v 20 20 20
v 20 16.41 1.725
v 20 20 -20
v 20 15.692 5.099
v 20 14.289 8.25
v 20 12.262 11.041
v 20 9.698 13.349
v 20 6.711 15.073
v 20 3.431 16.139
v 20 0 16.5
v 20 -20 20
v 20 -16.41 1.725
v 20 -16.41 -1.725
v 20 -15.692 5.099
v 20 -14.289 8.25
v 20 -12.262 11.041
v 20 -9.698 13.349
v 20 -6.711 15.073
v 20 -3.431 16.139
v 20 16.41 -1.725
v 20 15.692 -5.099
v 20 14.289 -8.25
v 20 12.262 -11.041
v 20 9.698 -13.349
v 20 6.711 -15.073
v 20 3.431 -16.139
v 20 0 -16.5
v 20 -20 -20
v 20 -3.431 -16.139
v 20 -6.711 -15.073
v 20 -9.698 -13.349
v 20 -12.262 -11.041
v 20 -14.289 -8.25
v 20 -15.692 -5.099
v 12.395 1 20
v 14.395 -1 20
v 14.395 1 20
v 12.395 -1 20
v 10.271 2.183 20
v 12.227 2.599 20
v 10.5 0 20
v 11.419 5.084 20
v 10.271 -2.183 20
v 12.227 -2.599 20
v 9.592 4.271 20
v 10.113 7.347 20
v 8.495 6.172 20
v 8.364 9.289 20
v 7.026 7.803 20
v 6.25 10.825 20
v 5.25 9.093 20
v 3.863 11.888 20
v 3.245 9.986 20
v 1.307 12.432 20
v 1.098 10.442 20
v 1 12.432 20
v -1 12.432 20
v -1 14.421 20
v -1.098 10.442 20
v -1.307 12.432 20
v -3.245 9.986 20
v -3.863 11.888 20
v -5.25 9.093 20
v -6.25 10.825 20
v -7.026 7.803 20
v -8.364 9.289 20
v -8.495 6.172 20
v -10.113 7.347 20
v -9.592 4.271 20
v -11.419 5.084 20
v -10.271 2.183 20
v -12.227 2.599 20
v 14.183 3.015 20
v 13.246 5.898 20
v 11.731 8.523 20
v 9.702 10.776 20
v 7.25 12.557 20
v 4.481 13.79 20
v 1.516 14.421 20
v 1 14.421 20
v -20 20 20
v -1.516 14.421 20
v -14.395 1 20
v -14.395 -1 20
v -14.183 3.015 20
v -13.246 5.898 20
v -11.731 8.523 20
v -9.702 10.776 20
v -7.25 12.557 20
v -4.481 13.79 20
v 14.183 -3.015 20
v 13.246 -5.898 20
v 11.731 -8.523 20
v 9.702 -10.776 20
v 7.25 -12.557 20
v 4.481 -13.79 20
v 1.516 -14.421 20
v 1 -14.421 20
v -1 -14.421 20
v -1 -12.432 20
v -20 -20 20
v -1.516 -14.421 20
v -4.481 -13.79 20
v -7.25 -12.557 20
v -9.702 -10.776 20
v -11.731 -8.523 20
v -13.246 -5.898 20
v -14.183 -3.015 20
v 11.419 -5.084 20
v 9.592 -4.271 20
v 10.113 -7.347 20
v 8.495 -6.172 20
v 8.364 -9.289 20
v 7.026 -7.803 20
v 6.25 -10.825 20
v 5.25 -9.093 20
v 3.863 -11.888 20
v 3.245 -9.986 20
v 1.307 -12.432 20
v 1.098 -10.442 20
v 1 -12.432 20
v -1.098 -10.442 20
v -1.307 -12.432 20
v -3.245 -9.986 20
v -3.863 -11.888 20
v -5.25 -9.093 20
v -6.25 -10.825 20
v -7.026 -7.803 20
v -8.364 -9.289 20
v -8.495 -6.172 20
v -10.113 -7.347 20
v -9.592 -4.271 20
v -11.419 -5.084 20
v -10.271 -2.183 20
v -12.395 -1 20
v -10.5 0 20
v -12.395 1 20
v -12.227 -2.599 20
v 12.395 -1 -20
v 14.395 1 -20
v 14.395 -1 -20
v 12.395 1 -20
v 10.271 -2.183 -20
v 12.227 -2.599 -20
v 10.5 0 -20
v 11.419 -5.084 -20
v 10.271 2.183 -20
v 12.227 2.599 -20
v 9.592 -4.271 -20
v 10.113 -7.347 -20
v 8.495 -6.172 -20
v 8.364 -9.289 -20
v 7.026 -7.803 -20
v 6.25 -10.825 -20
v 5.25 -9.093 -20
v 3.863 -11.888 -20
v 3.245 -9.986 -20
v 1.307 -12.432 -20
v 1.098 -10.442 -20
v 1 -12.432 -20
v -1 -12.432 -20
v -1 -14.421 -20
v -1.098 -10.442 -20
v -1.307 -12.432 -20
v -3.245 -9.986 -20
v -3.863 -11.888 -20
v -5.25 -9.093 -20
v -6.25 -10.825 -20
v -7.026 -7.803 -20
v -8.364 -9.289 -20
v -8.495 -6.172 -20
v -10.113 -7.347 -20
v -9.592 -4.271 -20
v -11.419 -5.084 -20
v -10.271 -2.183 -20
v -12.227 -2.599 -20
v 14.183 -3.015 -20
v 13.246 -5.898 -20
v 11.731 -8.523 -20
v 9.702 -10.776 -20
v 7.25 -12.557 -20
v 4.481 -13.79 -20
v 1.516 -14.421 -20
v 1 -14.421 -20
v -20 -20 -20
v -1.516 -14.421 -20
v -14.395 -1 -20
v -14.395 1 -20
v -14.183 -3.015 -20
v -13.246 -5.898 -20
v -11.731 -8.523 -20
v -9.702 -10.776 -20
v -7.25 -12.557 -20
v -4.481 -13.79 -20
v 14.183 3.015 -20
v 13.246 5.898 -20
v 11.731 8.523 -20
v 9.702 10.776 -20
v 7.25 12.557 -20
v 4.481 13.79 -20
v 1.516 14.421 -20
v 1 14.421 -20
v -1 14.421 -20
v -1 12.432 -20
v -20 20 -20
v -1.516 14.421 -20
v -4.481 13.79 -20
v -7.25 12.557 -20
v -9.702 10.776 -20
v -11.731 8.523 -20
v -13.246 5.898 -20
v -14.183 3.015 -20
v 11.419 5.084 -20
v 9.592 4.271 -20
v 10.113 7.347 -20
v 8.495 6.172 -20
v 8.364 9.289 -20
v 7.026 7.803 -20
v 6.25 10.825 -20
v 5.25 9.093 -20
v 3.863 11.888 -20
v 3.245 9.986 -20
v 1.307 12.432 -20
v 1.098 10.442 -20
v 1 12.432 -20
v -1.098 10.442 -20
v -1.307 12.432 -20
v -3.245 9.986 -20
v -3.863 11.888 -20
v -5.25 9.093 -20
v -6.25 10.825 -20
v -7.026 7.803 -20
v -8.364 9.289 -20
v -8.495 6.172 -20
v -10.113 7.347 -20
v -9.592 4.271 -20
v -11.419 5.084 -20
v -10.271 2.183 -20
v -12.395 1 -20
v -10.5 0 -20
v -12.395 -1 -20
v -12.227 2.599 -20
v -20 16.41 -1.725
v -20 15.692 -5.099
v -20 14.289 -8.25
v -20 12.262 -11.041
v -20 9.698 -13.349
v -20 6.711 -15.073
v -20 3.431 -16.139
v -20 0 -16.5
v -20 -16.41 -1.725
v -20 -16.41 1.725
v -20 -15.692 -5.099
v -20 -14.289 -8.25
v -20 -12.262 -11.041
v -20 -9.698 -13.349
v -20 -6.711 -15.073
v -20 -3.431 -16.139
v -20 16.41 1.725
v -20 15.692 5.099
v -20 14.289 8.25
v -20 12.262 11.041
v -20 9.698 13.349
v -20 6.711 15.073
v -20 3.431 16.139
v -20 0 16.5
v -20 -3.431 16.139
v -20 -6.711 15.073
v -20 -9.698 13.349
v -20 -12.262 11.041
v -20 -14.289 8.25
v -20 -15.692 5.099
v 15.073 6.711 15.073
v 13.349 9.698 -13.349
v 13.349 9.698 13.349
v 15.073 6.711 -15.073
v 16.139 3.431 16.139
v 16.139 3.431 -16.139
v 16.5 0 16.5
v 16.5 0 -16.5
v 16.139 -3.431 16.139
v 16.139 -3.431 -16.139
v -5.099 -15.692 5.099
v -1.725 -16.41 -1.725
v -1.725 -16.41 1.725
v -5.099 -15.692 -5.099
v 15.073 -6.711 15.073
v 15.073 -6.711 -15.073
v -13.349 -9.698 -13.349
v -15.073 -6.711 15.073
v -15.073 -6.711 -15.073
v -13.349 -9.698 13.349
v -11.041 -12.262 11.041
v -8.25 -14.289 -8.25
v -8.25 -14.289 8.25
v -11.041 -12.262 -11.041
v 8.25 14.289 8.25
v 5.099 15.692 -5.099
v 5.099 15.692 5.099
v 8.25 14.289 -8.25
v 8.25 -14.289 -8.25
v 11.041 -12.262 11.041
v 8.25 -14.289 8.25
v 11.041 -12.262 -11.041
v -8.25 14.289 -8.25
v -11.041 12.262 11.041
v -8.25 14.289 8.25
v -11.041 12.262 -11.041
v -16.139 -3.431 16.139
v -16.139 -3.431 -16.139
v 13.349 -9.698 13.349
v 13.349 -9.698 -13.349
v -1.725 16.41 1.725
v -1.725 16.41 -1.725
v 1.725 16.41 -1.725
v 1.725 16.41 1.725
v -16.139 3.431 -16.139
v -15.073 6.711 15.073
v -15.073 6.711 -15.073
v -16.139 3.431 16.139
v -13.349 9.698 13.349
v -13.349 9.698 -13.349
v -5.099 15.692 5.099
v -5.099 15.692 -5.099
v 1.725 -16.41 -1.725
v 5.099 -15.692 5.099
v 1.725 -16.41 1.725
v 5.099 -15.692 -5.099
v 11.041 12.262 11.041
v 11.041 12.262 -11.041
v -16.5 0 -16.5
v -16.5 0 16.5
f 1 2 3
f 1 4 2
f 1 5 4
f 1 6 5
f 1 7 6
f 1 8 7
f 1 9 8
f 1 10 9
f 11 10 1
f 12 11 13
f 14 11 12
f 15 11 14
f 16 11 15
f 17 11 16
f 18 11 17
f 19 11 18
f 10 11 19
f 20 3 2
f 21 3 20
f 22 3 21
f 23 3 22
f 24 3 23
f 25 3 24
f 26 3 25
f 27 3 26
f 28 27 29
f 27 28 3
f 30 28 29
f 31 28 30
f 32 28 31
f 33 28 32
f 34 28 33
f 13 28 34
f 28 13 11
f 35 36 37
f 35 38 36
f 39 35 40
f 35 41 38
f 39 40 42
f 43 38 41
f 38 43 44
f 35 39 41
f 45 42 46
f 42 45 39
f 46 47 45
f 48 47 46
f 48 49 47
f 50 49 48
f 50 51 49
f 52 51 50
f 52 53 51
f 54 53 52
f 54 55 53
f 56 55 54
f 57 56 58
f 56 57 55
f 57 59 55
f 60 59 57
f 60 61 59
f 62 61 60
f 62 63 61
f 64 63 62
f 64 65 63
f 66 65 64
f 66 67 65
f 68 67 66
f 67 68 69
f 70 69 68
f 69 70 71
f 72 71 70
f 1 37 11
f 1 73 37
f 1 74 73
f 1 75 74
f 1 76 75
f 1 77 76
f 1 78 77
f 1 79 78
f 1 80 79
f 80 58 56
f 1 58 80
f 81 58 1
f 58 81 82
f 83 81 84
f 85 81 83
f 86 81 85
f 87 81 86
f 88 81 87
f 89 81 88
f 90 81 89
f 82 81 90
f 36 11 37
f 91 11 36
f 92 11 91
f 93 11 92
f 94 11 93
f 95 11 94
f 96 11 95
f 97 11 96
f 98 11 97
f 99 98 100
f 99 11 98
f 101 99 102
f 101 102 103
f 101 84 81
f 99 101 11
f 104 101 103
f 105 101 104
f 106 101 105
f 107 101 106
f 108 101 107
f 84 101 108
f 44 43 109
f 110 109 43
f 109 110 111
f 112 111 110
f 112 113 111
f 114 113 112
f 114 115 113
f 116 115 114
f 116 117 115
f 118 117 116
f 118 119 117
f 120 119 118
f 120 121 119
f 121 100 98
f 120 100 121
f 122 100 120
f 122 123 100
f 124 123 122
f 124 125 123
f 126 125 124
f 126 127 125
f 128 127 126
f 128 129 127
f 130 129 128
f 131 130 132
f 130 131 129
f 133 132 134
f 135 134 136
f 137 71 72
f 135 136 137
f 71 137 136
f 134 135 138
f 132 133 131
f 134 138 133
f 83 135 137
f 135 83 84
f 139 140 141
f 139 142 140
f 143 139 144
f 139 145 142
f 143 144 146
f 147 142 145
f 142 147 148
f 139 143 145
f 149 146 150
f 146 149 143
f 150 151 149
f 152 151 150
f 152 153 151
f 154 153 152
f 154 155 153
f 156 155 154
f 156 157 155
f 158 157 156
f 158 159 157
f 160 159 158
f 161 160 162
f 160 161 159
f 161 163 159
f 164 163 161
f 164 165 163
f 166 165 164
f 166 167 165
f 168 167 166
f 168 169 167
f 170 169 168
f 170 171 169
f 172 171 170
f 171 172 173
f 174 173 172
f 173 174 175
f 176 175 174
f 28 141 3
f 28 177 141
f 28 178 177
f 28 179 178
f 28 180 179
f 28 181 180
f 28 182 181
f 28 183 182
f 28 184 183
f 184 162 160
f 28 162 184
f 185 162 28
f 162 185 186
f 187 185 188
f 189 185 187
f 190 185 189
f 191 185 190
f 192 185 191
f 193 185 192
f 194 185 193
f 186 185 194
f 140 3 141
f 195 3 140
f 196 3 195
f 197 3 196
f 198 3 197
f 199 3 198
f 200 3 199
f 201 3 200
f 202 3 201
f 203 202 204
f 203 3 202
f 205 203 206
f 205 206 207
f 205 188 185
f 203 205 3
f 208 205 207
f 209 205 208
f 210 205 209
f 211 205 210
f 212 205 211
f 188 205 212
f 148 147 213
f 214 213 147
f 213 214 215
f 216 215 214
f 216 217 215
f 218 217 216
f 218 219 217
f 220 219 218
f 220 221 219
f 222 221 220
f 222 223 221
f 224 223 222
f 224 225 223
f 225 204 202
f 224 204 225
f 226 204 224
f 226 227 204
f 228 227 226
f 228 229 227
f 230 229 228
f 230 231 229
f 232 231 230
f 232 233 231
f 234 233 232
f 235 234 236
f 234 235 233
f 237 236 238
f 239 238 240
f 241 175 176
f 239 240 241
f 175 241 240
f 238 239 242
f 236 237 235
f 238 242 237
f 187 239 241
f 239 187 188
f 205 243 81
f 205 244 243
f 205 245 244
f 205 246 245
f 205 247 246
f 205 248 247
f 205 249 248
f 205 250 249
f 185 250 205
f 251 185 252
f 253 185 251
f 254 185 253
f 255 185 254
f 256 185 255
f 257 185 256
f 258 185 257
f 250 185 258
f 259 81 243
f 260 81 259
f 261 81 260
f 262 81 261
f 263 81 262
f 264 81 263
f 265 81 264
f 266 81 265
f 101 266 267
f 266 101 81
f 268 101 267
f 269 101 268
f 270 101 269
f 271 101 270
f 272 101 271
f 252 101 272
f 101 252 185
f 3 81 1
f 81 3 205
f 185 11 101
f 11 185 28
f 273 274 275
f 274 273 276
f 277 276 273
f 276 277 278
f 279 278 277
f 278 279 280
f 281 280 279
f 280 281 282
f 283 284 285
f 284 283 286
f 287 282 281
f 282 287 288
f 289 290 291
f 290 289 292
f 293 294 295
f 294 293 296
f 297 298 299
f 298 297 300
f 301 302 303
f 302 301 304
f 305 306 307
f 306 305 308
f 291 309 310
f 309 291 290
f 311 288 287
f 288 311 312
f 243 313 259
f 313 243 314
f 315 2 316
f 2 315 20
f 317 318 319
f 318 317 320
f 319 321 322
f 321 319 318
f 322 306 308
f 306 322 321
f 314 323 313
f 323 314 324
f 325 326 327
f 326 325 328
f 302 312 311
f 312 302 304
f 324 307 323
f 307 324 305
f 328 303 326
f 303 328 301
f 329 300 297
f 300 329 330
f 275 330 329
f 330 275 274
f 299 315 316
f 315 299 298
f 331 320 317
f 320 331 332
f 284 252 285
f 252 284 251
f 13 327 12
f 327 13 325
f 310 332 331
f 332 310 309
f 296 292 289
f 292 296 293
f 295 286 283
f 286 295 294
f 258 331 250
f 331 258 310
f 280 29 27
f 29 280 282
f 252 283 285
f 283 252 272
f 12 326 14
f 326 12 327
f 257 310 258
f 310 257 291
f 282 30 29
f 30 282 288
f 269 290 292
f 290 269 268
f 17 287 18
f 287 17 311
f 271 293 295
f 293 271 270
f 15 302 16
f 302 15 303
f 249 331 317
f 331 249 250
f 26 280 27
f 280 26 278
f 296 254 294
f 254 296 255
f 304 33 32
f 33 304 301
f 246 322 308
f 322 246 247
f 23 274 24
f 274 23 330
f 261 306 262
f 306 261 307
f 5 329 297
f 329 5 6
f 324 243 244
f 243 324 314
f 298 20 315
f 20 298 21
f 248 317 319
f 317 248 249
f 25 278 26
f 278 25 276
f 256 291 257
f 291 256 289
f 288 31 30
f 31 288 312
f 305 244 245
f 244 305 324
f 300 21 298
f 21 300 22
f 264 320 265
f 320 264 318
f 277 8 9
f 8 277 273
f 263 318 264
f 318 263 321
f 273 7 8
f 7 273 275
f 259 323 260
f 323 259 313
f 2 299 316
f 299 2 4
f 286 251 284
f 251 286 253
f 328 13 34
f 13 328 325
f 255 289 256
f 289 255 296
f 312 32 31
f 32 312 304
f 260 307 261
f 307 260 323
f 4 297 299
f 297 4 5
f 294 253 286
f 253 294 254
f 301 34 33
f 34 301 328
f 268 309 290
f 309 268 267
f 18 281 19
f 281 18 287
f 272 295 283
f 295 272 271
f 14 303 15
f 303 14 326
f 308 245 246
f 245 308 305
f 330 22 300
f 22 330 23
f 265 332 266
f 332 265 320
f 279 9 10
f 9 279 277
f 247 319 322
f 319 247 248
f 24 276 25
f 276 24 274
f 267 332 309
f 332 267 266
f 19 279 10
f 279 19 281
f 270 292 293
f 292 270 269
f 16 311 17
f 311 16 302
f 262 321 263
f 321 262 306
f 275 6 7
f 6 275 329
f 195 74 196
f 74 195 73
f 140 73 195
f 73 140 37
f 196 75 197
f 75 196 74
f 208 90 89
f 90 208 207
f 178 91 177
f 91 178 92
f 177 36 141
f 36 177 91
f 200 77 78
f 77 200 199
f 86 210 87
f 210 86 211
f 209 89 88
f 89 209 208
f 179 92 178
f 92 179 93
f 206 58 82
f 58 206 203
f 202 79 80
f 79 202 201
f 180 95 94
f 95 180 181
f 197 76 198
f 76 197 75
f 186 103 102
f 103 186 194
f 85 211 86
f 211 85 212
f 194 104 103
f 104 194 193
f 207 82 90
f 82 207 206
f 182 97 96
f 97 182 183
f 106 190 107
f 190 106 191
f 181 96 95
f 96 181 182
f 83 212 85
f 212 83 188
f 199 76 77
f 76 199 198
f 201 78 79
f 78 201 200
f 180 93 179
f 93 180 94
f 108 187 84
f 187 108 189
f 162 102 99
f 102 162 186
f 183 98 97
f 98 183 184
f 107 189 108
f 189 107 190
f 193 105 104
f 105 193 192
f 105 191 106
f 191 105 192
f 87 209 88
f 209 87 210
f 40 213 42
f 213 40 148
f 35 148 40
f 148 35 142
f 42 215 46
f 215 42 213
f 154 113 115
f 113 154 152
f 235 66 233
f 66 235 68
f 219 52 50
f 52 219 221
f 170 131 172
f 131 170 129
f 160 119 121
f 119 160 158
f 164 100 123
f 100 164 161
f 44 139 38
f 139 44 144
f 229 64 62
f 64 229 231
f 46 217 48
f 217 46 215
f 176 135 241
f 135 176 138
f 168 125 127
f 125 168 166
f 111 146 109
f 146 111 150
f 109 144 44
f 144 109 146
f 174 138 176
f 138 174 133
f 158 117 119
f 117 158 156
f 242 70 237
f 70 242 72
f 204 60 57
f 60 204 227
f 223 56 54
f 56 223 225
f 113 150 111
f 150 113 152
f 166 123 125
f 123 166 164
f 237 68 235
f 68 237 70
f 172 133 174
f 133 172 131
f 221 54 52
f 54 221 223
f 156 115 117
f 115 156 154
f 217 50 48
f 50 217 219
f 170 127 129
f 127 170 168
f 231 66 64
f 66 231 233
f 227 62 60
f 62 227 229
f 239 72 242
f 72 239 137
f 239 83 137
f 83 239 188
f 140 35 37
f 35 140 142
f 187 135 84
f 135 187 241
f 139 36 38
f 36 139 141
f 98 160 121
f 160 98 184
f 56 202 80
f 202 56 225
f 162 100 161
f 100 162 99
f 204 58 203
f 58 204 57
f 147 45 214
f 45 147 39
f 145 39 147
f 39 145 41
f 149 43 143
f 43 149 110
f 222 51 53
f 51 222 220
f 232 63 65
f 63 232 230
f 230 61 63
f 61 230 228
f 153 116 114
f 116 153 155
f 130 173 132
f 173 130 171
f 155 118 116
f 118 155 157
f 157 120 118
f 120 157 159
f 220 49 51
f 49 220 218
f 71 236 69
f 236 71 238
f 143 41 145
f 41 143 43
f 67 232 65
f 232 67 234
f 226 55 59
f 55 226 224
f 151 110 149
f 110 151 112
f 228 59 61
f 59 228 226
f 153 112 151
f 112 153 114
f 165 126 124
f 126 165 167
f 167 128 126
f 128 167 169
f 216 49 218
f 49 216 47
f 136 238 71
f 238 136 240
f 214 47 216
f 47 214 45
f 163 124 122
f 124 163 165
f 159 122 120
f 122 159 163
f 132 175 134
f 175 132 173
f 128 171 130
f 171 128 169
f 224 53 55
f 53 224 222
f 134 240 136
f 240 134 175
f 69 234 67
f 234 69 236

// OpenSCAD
PEEK_chamber_height = 40;
PEEK_diameter = 15;
PEEK_chamber = (PEEK_diameter/2) + 3;
PEEK_chamber_outer = (PEEK_chamber)+6;
Fan_cube = 40;    // min PEEK_chamber_outer *2;
Fan_cube_hole = Fan_cube/2;




difference () {
	cube ([Fan_cube,Fan_cube,PEEK_chamber_height],center=true);
	cylinder(h = PEEK_chamber_height, r = PEEK_chamber_outer,center = true);
	rotate([0,90,0]) cylinder(h = PEEK_chamber_height+2, r = PEEK_chamber_outer,center = true);
	
};


translate ([0,0,0]) cut_out_tube();

module cut_out_tube(){
	difference () {
		cylinder(h = PEEK_chamber_height, r = PEEK_chamber_outer,center = true);
		cylinder(h = PEEK_chamber_height, r = PEEK_chamber,center = true);
		cut_out();
	};
};


module cut_out(){
	difference () {
		cylinder(h = PEEK_chamber_height, r = PEEK_chamber_outer-2,center = true);
		cylinder(h = PEEK_chamber_height, r = PEEK_chamber +2 ,center = true);

		cube ([(PEEK_chamber_outer*2)-2,2,PEEK_chamber_height],center = true);
		cube ([2,(PEEK_chamber_outer*2)-2,PEEK_chamber_height],center = true);
	};
};
